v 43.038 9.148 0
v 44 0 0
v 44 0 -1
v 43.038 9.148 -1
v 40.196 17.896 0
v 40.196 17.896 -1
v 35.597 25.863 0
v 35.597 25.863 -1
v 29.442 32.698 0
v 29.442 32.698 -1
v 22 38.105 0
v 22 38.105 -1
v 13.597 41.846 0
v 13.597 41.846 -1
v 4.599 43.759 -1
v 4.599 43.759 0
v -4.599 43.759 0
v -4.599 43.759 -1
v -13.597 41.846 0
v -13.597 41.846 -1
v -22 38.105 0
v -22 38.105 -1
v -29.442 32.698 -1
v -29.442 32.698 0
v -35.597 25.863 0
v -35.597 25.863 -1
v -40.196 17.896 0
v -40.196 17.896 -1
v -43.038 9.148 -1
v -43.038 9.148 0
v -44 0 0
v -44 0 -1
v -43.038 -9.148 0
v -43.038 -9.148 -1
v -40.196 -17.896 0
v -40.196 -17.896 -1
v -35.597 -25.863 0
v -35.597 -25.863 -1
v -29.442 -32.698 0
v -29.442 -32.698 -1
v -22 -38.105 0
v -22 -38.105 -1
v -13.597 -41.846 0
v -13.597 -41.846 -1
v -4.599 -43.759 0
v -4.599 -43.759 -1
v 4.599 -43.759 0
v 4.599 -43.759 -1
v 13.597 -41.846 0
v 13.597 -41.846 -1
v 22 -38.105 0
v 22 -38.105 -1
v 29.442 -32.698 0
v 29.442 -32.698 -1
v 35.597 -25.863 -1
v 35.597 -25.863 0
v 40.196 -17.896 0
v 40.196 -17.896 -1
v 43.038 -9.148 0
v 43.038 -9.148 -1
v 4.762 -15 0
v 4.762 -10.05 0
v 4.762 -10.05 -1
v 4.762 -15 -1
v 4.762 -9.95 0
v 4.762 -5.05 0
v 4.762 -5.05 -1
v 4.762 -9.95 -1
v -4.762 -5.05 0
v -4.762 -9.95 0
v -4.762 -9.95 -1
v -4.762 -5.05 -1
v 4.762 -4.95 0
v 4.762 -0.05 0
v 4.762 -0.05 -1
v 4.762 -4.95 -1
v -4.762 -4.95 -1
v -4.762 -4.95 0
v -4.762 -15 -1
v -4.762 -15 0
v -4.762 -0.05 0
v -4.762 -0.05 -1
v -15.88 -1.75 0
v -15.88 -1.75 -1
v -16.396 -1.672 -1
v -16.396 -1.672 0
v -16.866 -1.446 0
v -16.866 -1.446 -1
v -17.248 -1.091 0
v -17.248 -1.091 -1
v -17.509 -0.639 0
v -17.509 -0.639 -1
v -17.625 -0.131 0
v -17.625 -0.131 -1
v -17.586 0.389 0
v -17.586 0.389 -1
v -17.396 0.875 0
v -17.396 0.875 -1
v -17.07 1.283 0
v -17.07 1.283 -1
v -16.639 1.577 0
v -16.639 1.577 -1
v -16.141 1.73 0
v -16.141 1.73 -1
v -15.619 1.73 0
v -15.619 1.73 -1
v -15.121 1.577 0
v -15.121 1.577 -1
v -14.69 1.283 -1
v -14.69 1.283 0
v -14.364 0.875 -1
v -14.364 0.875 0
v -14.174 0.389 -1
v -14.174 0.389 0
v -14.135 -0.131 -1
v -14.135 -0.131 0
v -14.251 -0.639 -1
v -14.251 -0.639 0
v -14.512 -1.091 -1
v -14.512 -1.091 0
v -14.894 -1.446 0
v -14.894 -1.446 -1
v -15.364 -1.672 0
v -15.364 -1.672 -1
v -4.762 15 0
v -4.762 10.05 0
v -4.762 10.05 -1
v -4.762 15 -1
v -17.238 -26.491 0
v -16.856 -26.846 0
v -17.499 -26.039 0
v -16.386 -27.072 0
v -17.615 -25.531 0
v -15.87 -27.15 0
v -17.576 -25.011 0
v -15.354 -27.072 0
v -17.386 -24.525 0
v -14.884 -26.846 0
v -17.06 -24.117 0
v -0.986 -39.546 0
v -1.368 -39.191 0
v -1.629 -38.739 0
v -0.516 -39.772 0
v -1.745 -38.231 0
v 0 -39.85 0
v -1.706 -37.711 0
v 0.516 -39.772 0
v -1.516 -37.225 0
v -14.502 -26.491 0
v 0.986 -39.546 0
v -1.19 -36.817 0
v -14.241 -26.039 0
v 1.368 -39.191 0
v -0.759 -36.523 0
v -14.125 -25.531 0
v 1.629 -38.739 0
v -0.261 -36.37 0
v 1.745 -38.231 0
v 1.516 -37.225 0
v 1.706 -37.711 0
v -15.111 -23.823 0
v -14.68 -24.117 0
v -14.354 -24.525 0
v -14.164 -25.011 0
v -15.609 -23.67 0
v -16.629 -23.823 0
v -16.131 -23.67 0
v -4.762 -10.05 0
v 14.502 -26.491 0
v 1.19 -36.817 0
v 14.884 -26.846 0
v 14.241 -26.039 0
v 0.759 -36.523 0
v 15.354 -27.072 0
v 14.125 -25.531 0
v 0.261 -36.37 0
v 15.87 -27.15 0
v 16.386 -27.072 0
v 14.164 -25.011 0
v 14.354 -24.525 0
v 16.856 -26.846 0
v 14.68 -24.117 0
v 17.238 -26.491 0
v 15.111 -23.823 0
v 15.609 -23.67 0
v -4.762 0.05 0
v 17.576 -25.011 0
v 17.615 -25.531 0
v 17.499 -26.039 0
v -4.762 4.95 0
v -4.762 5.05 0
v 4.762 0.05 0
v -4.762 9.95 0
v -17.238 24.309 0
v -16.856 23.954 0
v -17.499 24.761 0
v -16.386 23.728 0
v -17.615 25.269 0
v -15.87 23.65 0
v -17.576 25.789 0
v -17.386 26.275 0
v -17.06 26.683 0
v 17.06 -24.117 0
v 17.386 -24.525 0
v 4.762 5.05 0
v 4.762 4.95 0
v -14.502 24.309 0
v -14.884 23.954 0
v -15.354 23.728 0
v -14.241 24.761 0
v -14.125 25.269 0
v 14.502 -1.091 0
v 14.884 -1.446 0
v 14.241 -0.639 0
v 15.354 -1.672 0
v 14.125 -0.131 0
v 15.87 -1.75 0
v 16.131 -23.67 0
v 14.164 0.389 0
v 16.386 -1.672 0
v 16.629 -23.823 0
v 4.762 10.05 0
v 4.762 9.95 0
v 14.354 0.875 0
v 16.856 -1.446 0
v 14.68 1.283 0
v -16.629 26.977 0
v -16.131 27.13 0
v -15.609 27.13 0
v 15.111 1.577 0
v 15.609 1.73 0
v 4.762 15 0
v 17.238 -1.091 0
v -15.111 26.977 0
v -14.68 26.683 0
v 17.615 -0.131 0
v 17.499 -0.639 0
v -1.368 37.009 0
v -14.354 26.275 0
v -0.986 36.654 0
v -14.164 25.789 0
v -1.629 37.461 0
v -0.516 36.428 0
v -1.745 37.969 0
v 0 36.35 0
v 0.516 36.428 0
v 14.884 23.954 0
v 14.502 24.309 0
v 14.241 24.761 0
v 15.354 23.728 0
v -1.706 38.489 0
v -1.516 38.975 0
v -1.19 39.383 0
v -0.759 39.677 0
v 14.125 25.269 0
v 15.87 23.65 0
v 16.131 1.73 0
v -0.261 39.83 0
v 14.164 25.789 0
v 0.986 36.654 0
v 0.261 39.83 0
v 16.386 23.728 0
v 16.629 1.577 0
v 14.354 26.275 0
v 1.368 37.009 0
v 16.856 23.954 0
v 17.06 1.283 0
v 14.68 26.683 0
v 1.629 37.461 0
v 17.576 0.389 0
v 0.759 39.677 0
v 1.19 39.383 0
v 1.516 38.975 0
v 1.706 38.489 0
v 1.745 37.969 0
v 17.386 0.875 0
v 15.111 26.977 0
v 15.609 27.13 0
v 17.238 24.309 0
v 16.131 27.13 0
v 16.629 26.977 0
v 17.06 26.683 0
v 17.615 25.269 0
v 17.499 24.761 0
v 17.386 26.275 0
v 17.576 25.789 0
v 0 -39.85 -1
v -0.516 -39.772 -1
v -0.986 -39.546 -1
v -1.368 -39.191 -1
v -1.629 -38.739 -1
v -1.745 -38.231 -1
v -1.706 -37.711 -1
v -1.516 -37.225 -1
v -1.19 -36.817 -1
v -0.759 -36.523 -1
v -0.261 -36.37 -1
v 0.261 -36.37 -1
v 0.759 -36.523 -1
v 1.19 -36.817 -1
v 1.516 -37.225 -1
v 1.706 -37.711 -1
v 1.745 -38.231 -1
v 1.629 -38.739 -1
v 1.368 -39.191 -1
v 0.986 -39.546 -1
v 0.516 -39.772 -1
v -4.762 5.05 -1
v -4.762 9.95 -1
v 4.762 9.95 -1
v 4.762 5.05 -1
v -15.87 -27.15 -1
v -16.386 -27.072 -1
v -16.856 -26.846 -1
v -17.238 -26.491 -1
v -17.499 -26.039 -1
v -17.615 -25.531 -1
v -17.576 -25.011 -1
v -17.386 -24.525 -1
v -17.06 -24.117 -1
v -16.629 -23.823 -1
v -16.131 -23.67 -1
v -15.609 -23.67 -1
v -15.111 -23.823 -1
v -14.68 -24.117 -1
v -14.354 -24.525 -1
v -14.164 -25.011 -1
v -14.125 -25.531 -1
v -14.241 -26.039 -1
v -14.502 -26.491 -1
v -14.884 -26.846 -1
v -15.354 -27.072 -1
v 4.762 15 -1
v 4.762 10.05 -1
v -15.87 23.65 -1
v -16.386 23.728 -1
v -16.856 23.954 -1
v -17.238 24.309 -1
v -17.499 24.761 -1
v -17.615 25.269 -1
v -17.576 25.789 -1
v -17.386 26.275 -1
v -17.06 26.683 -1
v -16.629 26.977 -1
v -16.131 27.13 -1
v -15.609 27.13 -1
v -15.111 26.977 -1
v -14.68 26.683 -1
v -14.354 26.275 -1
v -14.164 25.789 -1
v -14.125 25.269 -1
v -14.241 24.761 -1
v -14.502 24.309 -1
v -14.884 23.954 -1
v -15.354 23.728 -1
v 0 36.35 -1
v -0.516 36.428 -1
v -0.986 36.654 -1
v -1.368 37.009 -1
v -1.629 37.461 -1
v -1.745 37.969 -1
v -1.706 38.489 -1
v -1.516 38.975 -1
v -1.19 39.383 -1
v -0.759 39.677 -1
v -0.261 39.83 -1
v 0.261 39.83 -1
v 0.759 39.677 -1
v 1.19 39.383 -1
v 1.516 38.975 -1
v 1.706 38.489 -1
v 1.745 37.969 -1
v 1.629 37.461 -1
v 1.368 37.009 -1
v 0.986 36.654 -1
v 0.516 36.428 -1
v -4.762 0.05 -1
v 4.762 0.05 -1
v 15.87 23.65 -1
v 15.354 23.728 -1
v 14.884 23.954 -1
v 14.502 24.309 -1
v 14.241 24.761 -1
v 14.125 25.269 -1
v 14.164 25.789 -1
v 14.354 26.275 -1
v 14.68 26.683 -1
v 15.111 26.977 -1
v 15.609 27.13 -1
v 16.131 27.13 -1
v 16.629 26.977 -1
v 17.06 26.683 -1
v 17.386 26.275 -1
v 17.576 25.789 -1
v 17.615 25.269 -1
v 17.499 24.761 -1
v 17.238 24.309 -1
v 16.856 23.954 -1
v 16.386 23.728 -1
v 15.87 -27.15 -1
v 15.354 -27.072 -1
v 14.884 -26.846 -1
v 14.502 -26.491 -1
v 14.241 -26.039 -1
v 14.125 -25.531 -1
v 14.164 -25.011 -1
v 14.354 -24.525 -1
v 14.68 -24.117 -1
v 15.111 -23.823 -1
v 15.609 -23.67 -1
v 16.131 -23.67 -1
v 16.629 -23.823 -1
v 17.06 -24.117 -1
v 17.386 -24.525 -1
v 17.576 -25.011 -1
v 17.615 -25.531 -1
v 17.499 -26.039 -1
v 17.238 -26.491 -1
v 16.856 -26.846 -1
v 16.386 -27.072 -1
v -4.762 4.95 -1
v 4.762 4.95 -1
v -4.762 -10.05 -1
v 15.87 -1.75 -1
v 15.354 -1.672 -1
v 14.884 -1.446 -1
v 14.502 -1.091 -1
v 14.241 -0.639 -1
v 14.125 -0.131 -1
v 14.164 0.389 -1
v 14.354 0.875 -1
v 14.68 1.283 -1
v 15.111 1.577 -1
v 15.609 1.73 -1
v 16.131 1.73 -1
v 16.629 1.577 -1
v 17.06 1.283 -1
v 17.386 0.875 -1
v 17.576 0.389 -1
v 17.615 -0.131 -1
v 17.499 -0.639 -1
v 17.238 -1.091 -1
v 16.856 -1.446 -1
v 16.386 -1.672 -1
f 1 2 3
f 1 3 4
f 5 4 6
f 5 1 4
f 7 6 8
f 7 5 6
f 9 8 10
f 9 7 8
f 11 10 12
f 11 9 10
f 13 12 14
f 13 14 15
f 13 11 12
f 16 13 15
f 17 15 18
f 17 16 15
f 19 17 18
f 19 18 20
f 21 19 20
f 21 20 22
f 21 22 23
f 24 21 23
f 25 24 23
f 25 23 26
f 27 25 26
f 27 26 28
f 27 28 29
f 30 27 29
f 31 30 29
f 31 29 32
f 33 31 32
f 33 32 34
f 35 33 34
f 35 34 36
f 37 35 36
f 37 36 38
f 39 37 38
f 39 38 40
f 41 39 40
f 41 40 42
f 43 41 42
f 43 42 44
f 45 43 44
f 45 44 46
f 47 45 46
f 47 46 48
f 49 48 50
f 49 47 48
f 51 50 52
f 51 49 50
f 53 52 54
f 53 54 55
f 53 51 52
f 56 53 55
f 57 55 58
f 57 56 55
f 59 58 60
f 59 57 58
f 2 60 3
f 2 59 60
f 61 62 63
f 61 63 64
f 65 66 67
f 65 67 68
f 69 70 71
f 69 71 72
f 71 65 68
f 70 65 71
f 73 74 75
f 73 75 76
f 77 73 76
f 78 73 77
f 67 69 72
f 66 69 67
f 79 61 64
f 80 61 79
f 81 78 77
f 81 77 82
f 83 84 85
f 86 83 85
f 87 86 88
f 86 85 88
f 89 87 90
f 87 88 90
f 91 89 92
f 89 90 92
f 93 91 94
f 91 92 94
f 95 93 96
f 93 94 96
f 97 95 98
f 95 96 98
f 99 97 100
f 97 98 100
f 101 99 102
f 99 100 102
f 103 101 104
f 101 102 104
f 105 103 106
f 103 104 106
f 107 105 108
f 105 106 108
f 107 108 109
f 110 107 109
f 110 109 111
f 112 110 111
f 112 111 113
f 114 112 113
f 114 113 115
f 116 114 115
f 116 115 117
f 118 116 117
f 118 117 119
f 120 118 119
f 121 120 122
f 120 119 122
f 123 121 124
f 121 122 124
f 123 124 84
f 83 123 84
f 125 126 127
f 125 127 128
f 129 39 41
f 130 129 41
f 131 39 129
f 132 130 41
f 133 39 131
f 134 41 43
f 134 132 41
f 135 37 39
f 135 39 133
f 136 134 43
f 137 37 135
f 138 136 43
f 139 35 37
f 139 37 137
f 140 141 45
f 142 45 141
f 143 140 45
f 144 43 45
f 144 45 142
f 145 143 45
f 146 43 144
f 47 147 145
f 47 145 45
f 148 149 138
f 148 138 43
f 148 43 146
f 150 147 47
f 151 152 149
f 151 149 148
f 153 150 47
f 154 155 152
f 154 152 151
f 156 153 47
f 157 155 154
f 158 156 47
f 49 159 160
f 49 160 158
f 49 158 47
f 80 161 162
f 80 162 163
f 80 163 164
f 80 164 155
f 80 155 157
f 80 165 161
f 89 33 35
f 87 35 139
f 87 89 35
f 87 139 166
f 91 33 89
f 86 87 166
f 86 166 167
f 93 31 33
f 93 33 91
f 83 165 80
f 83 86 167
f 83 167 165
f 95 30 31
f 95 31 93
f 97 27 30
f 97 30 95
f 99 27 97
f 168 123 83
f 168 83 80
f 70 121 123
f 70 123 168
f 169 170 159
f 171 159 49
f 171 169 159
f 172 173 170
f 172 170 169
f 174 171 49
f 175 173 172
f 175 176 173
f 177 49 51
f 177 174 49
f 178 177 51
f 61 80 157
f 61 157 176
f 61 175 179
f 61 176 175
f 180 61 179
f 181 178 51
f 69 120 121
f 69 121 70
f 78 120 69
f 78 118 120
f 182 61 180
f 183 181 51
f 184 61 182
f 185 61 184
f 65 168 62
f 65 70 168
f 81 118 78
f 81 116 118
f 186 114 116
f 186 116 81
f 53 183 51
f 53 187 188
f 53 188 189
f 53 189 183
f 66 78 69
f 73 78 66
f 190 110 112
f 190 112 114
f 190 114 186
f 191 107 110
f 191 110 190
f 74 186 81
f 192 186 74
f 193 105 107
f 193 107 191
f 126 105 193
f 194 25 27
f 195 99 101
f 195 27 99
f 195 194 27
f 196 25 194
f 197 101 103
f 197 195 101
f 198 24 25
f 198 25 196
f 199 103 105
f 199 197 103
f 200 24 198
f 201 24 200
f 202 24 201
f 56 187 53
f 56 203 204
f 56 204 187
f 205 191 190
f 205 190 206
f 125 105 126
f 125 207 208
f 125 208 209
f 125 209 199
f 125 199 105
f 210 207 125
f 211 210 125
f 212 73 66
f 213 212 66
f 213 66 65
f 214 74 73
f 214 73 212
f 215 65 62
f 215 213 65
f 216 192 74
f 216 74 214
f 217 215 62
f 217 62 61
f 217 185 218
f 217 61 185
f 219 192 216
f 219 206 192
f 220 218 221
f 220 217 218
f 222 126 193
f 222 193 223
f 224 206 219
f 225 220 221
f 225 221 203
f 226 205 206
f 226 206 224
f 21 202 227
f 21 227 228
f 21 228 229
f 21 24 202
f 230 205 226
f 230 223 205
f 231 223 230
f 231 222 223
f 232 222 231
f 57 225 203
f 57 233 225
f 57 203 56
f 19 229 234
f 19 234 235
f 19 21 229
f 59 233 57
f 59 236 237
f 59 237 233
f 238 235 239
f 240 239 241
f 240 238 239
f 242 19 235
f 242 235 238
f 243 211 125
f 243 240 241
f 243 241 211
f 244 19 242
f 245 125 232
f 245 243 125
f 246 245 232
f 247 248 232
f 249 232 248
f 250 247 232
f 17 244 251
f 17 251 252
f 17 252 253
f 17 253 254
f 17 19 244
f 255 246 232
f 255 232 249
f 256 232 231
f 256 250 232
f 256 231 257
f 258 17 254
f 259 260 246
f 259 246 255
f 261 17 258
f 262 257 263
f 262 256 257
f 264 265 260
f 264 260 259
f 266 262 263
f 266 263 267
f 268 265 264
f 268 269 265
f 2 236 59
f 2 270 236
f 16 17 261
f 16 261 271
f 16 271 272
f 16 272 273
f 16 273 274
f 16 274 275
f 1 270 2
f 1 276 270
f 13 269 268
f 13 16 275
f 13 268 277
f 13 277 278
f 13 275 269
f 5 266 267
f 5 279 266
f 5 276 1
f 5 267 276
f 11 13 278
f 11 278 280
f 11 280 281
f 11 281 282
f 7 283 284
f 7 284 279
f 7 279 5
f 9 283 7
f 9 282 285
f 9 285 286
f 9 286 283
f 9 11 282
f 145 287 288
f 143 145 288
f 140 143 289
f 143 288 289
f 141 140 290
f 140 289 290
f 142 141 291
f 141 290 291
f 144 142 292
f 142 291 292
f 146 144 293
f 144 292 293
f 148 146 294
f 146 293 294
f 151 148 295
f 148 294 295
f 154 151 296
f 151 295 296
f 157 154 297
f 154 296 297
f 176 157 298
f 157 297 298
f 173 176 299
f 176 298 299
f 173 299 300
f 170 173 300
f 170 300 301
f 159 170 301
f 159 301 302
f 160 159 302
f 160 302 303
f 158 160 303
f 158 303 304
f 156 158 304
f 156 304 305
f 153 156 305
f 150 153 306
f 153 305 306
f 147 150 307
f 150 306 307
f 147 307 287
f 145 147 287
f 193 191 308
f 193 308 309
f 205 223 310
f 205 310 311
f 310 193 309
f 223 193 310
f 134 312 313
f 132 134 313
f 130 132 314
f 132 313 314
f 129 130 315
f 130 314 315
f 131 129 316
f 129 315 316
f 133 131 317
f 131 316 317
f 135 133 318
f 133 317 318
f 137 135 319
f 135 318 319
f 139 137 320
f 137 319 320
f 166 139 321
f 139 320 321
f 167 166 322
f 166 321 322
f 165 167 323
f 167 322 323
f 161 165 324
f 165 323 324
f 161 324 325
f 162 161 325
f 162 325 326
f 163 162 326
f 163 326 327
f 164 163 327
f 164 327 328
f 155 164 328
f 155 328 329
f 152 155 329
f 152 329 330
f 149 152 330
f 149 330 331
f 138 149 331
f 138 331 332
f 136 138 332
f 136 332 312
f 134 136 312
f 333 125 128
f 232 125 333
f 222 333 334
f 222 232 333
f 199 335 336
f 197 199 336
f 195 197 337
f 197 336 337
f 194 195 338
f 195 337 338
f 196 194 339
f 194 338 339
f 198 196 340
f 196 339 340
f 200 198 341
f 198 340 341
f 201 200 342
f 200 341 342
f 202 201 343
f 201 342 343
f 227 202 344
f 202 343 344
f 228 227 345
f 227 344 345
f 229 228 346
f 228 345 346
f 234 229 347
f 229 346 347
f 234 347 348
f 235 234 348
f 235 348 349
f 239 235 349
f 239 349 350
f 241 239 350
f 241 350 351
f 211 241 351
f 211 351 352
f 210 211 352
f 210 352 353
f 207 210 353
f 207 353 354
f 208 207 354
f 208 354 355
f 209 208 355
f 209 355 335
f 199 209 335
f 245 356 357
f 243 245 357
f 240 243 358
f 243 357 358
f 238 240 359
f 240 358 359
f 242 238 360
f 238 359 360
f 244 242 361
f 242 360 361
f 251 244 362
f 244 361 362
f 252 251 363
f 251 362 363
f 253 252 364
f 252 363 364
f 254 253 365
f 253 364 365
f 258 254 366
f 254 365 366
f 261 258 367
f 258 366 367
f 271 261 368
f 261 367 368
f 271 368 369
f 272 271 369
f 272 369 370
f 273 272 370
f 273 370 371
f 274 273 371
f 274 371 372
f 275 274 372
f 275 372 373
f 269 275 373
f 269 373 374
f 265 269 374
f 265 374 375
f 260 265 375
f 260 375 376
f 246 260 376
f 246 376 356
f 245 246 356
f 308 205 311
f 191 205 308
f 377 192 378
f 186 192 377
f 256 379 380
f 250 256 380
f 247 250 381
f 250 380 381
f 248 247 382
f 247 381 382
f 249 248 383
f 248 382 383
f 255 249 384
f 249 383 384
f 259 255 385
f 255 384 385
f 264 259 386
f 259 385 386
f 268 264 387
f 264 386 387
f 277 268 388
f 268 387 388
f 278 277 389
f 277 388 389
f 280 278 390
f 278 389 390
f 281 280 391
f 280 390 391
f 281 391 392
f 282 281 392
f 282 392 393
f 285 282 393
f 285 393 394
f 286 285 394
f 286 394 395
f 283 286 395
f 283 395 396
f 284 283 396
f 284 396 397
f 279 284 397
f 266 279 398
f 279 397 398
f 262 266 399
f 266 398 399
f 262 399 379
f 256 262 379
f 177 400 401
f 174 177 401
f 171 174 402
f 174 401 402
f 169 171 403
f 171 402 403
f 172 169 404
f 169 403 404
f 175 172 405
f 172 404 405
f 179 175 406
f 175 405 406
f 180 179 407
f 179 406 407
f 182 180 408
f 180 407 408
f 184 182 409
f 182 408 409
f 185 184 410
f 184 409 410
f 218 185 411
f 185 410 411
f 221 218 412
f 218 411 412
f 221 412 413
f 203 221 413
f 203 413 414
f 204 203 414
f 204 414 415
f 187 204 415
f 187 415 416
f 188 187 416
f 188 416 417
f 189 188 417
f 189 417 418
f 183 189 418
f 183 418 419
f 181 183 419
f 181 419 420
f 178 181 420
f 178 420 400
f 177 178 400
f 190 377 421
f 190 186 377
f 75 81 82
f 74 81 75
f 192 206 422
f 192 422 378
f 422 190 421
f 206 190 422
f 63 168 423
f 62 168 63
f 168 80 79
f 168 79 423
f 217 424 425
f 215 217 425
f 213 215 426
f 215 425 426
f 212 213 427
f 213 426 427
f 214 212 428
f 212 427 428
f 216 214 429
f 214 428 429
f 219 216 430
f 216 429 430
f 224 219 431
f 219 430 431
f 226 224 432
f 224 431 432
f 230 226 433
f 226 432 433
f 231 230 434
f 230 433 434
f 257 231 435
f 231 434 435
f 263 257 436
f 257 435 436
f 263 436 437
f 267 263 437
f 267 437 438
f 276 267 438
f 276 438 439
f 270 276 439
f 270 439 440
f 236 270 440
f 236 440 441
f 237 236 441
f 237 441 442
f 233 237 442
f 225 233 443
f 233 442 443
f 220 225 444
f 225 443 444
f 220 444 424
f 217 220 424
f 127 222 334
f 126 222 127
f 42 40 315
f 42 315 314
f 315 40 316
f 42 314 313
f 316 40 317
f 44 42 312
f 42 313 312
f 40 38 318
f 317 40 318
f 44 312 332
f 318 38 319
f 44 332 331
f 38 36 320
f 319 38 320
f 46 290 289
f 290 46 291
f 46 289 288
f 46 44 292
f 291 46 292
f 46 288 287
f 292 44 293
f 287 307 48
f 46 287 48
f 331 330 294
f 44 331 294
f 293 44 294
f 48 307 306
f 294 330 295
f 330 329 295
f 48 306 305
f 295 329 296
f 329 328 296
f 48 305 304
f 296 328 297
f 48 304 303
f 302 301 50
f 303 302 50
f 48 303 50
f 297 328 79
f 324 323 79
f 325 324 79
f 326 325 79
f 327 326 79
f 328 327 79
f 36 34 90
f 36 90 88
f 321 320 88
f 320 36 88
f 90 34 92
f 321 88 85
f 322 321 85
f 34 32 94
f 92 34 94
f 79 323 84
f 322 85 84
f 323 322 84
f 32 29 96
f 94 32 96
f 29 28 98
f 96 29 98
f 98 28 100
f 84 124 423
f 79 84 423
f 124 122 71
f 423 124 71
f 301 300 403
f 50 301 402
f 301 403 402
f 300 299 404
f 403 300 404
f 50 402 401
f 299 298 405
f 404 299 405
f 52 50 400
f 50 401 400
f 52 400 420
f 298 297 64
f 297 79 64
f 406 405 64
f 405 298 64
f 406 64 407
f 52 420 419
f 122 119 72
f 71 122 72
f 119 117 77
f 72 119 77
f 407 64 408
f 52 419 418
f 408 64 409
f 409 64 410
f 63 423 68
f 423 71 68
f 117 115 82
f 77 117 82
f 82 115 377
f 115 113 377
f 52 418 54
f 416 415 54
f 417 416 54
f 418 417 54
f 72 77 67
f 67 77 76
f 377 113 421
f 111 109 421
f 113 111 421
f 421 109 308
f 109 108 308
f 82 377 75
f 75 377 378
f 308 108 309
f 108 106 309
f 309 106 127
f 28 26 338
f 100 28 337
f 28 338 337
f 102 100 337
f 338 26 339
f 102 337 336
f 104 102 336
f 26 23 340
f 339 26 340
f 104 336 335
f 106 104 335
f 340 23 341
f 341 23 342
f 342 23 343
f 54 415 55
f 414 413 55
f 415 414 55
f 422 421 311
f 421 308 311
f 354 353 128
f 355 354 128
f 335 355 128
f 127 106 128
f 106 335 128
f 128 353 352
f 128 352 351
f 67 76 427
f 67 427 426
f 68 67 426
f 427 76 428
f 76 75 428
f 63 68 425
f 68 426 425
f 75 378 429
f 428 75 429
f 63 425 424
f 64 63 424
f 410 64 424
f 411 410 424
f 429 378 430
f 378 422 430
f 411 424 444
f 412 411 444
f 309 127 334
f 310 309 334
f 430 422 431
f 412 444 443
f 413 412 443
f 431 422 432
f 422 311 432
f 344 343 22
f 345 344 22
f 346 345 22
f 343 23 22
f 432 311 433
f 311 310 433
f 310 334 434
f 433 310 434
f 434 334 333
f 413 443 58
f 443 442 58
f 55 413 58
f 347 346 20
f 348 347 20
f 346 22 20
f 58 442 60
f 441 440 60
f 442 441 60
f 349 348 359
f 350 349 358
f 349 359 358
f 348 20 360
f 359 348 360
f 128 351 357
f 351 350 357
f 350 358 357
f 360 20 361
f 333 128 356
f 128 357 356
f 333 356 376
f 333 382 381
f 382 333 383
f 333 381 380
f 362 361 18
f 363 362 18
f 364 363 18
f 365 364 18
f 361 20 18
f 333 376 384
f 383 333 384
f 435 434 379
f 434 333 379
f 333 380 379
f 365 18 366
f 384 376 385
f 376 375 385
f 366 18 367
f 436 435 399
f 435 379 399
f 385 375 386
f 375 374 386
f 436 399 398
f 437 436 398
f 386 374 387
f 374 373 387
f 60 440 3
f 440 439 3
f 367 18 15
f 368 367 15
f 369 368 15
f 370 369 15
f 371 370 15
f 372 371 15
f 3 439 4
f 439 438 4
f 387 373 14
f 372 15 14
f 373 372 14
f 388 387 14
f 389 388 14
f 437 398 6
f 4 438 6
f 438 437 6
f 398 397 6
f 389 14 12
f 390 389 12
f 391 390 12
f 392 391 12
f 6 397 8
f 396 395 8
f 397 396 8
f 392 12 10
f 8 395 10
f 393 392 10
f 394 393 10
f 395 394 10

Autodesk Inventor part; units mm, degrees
ref_plane "YZ Plane" through (0, 0, 0) normal (1, 0, 0) x (0, 1, 0)
ref_plane "XZ Plane" through (0, 0, 0) normal (0, 1, 0) x (-1, 0, 0)
ref_plane "XY Plane" through (0, 0, 0) normal (0, 0, 1) x (1, 0, 0)
sketch "Sketch1" plane through (0, 0, 0) normal (0, 0, 1) x (1, 0, 0)
  circle A0 centre (0, 0) radius 44
  dimension "d0" = 88
extrude "Extrusion1" add sketch "Sketch1" against normal blind 1
sketch "Sketch2" plane through (0, 0, 0) normal (0, 0, 1) x (1, 0, 0)
  circle A0 centre (0, 0) radius 44 projected
  circle A1 centre (0, 38.1) radius 1.75
  circle A2 centre (0, -38.1) radius 1.75
  circle A3 centre (15.87, 0) radius 1.75
  circle A4 centre (-15.88, 0) radius 1.75
  circle A5 centre (-15.87, 25.4) radius 1.75
  circle A6 centre (-15.87, -25.4) radius 1.75
  circle A7 centre (15.87, 25.4) radius 1.75
  circle A8 centre (15.87, -25.4) radius 1.75
  dimension "d4" = 3.5
  dimension "d6" = 3.5
  dimension "d7" = 76.2
  dimension "d8" = 38.1
  dimension "d9" = 3.5
  dimension "d10" = 3.5
  dimension "d11" = 31.75
  dimension "d12" = 15.87
  dimension "d13" = 3.5
  dimension "d14" = 3.5
  dimension "d15" = 3.5
  dimension "d16" = 3.5
  dimension "d17" = 25.4
  dimension "d18" = 25.4
  dimension "d19" = 25.4
  dimension "d20" = 25.4
  dimension "d21" = 15.87
  dimension "d22" = 15.87
  dimension "d23" = 15.87
  dimension "d24" = 15.87
hole "Hole2" at (-15.87, 25.4, 0) at (0, 38.1, 0) at (15.87, 25.4, 0) at (15.87, 0, 0) at (15.87, -25.4, 0) at (0, -38.1, 0) at (-15.87, -25.4, 0) at (-15.88, 0, 0) direction (0, 0, -1) diameter 3.5 end through all
sketch "Sketch4" plane through (0, 0, 0) normal (0, 0, 1) x (1, 0, 0)
  circle A0 centre (0, 0) radius 44 projected
  line L0 (-4.7625, 15) -> (4.7625, 15)
  line L1 (4.7625, 15) -> (4.7625, 10.05)
  line L2 (4.7625, 10.05) -> (-4.7625, 10.05)
  line L3 (-4.7625, 10.05) -> (-4.7625, 15)
  line L4 (-4.7625, 9.95) -> (4.7625, 9.95)
  line L5 (4.7625, 9.95) -> (4.7625, 5.05)
  line L6 (4.7625, 5.05) -> (-4.7625, 5.05)
  line L7 (-4.7625, 5.05) -> (-4.7625, 9.95)
  line L8 (-4.7625, 4.95) -> (4.7625, 4.95)
  line L9 (4.7625, 4.95) -> (4.7625, 0.05)
  line L10 (4.7625, 0.05) -> (-4.7625, 0.05)
  line L11 (-4.7625, 0.05) -> (-4.7625, 4.95)
  line L12 (-4.7625, -0.05) -> (4.7625, -0.05)
  line L13 (4.7625, -0.05) -> (4.7625, -4.95)
  line L14 (4.7625, -4.95) -> (-4.7625, -4.95)
  line L15 (-4.7625, -4.95) -> (-4.7625, -0.05)
  line L16 (-4.7625, -5.05) -> (4.7625, -5.05)
  line L17 (4.7625, -5.05) -> (4.7625, -9.95)
  line L18 (4.7625, -9.95) -> (-4.7625, -9.95)
  line L19 (-4.7625, -9.95) -> (-4.7625, -5.05)
  line L20 (-4.7625, -10.05) -> (4.7625, -10.05)
  line L21 (4.7625, -10.05) -> (4.7625, -15)
  line L22 (4.7625, -15) -> (-4.7625, -15)
  line L23 (-4.7625, -15) -> (-4.7625, -10.05)
  dimension "d53" = 9.525
  dimension "d55" = 4.95
  dimension "d56" = 15
  dimension "d57" = 4.7625
  dimension "d58" = 4.9
  dimension "d59" = 9.525
  dimension "d60" = 4.7625
  dimension "d61" = 9.95
  dimension "d62" = 4.9
  dimension "d63" = 0.05
  dimension "d64" = 9.525
  dimension "d65" = 4.7625
  dimension "d66" = 9.525
  dimension "d67" = 4.7625
  dimension "d68" = 4.9
  dimension "d69" = 0.05
  dimension "d70" = 4.9
  dimension "d71" = 9.525
  dimension "d72" = 4.7625
  dimension "d73" = 5.05
  dimension "d74" = 10.05
  dimension "d75" = 4.95
  dimension "d76" = 9.525
  dimension "d77" = 4.7625
extrude "Extrusion2" cut sketch "Sketch4" against normal up to next contours L0 L1 L2 L3 | L4 L5 L6 L7 | L8 L9 L10 L11 | L12 L13 L14 L15 | L16 L17 L18 L19 | L20 L21 L22 L23
equation "\"d6\" = d4"
equation "\"d9\" = d4"
equation "\"d10\" = d4"
equation "\"d13\" = d4"
equation "\"d14\" = d4"
equation "\"d15\" = d4"
equation "\"d16\" = d4"
equation "\"d21\" = d12"
equation "\"d22\" = d12"
equation "\"d23\" = d12"
equation "\"d24\" = d12"
equation "\"d37\" = Thickness"
equation "\"d57\" = 0.5 * d53"
equation "\"d59\" = d53"
equation "\"d60\" = 0.5 * d53"
equation "\"d64\" = d53"
equation "\"d65\" = 0.5 * d53"
equation "\"d66\" = d53"
equation "\"d67\" = 0.5 * d53"
equation "\"d71\" = d53"
equation "\"d72\" = 0.5 * d53"
equation "\"d76\" = d53"
equation "\"d77\" = 0.5 * d53"
equation "\"BendRadius\" = Thickness"
equation "\"BendReliefWidth\" = Thickness"
equation "\"BendReliefDepth\" = 0.5 * Thickness"
equation "\"CornerReliefSize\" = 4 * Thickness"
equation "\"MinimumRemnant\" = 2 * Thickness"
equation "\"TransitionRadius\" = BendRadius"
equation "\"JacobiRadiusSize\" = BendRadius"
equation "\"GapSize\" = Thickness"
equation "\"Thickness\" = 0.5"
properties part number "Plate"
